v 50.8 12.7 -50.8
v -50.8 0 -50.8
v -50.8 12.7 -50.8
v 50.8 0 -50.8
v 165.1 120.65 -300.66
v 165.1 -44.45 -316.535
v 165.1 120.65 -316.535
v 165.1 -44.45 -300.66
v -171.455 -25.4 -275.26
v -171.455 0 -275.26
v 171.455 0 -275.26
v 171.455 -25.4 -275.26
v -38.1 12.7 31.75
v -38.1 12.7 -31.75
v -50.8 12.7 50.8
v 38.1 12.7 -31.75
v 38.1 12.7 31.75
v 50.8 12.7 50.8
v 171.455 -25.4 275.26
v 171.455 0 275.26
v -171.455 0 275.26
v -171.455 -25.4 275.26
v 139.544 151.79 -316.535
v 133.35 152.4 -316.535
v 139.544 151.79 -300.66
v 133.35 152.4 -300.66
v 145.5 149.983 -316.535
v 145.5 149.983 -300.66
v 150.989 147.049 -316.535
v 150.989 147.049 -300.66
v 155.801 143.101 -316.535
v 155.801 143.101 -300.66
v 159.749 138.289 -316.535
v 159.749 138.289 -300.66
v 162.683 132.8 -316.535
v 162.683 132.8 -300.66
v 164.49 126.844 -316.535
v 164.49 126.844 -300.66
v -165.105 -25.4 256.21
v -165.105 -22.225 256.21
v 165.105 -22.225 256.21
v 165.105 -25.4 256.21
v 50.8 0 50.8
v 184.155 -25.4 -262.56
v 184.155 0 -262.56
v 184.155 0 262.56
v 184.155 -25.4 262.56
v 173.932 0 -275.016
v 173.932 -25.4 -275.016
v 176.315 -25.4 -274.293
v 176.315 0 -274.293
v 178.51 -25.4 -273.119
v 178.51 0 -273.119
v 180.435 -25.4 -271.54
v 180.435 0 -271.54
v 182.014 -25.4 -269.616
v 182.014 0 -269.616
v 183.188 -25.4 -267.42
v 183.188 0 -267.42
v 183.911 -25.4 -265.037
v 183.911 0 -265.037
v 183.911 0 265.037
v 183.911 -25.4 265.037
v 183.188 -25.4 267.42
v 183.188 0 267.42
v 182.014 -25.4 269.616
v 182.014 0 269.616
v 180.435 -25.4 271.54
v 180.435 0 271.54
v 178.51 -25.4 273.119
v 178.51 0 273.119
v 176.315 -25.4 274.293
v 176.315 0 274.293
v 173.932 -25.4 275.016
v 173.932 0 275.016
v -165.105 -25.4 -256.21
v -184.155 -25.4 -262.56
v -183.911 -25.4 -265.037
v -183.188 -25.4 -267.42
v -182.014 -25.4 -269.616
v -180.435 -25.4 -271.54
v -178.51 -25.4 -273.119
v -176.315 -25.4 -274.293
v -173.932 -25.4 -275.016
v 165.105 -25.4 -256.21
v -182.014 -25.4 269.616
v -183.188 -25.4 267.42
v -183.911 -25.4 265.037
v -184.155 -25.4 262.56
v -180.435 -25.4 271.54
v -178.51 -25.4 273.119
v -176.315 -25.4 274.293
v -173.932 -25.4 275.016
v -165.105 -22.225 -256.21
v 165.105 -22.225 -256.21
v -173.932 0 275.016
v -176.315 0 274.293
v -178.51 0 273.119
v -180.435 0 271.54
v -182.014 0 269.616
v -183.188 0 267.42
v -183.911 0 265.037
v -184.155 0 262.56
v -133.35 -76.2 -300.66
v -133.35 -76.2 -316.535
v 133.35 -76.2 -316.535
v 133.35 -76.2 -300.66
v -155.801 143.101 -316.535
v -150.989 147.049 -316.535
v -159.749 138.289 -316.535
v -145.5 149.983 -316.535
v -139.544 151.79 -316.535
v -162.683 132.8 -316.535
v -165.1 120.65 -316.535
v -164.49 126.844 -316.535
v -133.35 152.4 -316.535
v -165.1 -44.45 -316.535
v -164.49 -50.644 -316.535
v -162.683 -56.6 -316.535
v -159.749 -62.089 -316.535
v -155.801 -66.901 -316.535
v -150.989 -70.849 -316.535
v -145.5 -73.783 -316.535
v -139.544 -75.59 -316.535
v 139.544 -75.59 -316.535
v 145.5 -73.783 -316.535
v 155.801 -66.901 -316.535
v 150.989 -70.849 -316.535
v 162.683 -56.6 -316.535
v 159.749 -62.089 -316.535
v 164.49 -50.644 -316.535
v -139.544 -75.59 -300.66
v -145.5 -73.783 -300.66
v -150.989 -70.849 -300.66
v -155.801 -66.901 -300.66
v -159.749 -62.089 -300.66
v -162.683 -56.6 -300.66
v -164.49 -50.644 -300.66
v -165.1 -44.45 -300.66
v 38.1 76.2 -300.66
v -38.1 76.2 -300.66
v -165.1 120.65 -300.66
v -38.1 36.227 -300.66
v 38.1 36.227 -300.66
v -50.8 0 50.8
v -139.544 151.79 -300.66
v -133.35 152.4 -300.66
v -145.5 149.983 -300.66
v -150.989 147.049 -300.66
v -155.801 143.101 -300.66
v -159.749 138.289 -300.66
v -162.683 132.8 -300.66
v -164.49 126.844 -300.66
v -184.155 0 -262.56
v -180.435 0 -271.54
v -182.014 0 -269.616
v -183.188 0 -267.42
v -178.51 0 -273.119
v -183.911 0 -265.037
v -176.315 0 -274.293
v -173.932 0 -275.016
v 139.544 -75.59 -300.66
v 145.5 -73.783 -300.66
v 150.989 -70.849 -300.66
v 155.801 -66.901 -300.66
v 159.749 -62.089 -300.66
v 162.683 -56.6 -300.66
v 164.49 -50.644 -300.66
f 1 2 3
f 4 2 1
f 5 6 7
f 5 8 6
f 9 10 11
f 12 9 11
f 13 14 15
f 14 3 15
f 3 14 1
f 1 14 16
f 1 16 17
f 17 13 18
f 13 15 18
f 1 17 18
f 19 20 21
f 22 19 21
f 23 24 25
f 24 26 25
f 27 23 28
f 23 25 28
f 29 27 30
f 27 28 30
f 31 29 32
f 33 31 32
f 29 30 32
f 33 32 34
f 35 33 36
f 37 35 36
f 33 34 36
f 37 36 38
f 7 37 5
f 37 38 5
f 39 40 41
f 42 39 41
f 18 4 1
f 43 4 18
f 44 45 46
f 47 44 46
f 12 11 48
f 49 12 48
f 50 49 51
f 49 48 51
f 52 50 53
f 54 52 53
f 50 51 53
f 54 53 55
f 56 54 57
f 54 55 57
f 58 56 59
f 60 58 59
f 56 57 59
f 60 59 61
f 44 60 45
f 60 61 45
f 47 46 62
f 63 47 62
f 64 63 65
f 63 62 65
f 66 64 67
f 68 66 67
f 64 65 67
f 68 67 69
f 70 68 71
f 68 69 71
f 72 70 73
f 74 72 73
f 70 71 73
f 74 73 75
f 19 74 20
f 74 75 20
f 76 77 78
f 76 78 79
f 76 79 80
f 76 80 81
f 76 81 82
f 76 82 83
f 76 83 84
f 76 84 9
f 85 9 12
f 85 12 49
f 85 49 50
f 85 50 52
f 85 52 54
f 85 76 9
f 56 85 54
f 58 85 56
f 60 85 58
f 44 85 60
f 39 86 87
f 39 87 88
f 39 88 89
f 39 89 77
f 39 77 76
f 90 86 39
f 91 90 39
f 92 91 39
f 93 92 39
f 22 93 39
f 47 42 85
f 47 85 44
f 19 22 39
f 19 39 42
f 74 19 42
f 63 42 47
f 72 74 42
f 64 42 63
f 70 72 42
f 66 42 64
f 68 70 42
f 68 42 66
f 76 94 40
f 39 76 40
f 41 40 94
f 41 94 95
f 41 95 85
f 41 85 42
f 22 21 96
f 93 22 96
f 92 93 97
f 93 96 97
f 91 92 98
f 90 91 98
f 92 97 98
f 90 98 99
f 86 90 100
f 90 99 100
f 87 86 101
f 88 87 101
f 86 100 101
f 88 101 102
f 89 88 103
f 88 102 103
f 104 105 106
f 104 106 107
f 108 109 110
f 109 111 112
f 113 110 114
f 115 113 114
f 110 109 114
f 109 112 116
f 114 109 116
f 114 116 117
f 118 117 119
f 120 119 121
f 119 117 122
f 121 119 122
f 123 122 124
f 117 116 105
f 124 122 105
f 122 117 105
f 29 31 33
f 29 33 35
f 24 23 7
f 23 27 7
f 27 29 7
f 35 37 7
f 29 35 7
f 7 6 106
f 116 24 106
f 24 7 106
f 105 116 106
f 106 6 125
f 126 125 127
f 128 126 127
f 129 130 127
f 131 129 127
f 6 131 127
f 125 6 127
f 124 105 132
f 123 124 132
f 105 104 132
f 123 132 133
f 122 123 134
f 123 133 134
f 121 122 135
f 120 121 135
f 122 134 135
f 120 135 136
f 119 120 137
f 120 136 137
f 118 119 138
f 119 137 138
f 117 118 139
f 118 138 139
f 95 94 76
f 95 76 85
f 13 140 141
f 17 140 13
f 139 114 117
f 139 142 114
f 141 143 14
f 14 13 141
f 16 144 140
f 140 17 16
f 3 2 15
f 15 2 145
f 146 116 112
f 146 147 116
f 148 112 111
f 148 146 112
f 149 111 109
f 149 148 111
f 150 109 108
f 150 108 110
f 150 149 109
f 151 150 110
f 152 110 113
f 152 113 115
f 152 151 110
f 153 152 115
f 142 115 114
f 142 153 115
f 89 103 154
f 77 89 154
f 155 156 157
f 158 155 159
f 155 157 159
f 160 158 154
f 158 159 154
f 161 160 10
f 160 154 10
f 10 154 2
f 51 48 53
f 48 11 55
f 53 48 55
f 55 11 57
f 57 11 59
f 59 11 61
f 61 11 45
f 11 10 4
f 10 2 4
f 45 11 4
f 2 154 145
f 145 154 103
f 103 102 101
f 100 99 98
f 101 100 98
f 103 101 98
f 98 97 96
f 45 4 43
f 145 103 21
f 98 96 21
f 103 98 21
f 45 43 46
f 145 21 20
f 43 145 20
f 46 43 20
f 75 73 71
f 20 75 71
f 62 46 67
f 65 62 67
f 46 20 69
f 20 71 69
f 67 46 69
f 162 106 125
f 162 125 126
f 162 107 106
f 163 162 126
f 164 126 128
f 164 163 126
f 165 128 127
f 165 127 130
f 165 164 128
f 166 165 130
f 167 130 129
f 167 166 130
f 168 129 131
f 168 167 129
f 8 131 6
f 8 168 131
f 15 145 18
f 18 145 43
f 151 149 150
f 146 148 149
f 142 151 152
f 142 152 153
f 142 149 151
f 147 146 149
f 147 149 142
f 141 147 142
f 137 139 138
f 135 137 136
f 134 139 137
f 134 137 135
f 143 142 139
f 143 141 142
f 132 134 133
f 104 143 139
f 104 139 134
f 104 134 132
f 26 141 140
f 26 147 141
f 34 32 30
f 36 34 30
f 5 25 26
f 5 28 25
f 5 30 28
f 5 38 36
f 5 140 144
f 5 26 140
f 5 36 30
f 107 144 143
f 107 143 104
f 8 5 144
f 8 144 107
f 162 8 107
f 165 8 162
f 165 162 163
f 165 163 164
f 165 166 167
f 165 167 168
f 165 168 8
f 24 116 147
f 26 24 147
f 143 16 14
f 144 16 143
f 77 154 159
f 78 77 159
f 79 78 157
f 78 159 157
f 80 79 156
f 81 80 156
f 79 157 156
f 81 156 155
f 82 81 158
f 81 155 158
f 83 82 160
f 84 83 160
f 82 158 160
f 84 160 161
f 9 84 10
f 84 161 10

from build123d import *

# Parameters (mm, degrees)
F0_W      = 330.2095
F0_H      = 512.4196
F1_DEPTH  = 25.4
F2_DEPTH  = 22.225
F3_W      = 101.6
F3_H      = 101.6
F4_DEPTH  = 12.7
F6_DEPTH  = 38.1
F7_W      = 228.6
F7_H      = 15.875
F8_DEPTH  = 127
F9_W      = 228.6
F9_H      = 15.875
F10_DEPTH = 127
F11_R     = 31.75


with BuildPart() as f1:
    # F0 (on Front) → F1 (new body)
    with BuildSketch(Plane.XZ):
        with BuildLine():
            Line((184.15475, -262.5598), (184.15475, 262.5598))
            ThreePointArc((184.15475, 262.5598), (180.435006, 271.540056), (171.45475, 275.2598))
            Line((171.45475, 275.2598), (-171.45475, 275.2598))
            ThreePointArc((-171.45475, 275.2598), (-180.435006, 271.540056), (-184.15475, 262.5598))
            Line((-184.15475, 262.5598), (-184.15475, -262.5598))
            ThreePointArc((-184.15475, -262.5598), (-180.435006, -271.540056), (-171.45475, -275.2598))
            Line((-171.45475, -275.2598), (171.45475, -275.2598))
            ThreePointArc((171.45475, -275.2598), (180.435006, -271.540056), (184.15475, -262.5598))
        make_face()
        Rectangle(F0_W, F0_H, mode=Mode.SUBTRACT)
    extrude(amount=F1_DEPTH)

    # F0 (on Front) → F2 (join)
    with BuildSketch(Plane.XZ):
        Rectangle(F0_W, F0_H)
    extrude(amount=F2_DEPTH)

    # F3 (on face) → F4 (join)
    with BuildSketch(Plane.XZ):
        Rectangle(F3_W, F3_H)
    extrude(amount=-F4_DEPTH)

    # F5 (on Right) → F6 (join, symmetric)
    with BuildSketch(Plane.YZ):
        Polygon((12.7, 31.75), (12.7, -31.75), (36.226559, -300.6598), (-76.2, -300.6598), (-76.2, -316.5348), (152.4, -316.5348), (152.4, -300.6598), (76.2, -300.6598), align=None)
    extrude(amount=F6_DEPTH, both=True)

    # F7 (on face) → F8 (join)
    with BuildSketch(Plane.YZ.offset(38.1)):
        with Locations((38.1, -308.5973)):
            Rectangle(F7_W, F7_H)
    extrude(amount=F8_DEPTH)

    # F9 (on face) → F10 (join)
    with BuildSketch(Plane(origin=(-38.1, 0, 0), x_dir=(0, -1, 0), z_dir=(-1, 0, 0))):
        with Locations((-38.1, -308.5973)):
            Rectangle(F9_W, F9_H)
    extrude(amount=F10_DEPTH)

    # F11
    f11_edges = [f1.edges().sort_by_distance(p)[0] for p in [
        (-165.1, 152.4, -308.5973),
        (165.1, 152.4, -308.5973),
        (165.1, -76.2, -308.5973),
        (-165.1, -76.2, -308.5973),
    ]]
    fillet(f11_edges, radius=F11_R)


solid = f1.part
